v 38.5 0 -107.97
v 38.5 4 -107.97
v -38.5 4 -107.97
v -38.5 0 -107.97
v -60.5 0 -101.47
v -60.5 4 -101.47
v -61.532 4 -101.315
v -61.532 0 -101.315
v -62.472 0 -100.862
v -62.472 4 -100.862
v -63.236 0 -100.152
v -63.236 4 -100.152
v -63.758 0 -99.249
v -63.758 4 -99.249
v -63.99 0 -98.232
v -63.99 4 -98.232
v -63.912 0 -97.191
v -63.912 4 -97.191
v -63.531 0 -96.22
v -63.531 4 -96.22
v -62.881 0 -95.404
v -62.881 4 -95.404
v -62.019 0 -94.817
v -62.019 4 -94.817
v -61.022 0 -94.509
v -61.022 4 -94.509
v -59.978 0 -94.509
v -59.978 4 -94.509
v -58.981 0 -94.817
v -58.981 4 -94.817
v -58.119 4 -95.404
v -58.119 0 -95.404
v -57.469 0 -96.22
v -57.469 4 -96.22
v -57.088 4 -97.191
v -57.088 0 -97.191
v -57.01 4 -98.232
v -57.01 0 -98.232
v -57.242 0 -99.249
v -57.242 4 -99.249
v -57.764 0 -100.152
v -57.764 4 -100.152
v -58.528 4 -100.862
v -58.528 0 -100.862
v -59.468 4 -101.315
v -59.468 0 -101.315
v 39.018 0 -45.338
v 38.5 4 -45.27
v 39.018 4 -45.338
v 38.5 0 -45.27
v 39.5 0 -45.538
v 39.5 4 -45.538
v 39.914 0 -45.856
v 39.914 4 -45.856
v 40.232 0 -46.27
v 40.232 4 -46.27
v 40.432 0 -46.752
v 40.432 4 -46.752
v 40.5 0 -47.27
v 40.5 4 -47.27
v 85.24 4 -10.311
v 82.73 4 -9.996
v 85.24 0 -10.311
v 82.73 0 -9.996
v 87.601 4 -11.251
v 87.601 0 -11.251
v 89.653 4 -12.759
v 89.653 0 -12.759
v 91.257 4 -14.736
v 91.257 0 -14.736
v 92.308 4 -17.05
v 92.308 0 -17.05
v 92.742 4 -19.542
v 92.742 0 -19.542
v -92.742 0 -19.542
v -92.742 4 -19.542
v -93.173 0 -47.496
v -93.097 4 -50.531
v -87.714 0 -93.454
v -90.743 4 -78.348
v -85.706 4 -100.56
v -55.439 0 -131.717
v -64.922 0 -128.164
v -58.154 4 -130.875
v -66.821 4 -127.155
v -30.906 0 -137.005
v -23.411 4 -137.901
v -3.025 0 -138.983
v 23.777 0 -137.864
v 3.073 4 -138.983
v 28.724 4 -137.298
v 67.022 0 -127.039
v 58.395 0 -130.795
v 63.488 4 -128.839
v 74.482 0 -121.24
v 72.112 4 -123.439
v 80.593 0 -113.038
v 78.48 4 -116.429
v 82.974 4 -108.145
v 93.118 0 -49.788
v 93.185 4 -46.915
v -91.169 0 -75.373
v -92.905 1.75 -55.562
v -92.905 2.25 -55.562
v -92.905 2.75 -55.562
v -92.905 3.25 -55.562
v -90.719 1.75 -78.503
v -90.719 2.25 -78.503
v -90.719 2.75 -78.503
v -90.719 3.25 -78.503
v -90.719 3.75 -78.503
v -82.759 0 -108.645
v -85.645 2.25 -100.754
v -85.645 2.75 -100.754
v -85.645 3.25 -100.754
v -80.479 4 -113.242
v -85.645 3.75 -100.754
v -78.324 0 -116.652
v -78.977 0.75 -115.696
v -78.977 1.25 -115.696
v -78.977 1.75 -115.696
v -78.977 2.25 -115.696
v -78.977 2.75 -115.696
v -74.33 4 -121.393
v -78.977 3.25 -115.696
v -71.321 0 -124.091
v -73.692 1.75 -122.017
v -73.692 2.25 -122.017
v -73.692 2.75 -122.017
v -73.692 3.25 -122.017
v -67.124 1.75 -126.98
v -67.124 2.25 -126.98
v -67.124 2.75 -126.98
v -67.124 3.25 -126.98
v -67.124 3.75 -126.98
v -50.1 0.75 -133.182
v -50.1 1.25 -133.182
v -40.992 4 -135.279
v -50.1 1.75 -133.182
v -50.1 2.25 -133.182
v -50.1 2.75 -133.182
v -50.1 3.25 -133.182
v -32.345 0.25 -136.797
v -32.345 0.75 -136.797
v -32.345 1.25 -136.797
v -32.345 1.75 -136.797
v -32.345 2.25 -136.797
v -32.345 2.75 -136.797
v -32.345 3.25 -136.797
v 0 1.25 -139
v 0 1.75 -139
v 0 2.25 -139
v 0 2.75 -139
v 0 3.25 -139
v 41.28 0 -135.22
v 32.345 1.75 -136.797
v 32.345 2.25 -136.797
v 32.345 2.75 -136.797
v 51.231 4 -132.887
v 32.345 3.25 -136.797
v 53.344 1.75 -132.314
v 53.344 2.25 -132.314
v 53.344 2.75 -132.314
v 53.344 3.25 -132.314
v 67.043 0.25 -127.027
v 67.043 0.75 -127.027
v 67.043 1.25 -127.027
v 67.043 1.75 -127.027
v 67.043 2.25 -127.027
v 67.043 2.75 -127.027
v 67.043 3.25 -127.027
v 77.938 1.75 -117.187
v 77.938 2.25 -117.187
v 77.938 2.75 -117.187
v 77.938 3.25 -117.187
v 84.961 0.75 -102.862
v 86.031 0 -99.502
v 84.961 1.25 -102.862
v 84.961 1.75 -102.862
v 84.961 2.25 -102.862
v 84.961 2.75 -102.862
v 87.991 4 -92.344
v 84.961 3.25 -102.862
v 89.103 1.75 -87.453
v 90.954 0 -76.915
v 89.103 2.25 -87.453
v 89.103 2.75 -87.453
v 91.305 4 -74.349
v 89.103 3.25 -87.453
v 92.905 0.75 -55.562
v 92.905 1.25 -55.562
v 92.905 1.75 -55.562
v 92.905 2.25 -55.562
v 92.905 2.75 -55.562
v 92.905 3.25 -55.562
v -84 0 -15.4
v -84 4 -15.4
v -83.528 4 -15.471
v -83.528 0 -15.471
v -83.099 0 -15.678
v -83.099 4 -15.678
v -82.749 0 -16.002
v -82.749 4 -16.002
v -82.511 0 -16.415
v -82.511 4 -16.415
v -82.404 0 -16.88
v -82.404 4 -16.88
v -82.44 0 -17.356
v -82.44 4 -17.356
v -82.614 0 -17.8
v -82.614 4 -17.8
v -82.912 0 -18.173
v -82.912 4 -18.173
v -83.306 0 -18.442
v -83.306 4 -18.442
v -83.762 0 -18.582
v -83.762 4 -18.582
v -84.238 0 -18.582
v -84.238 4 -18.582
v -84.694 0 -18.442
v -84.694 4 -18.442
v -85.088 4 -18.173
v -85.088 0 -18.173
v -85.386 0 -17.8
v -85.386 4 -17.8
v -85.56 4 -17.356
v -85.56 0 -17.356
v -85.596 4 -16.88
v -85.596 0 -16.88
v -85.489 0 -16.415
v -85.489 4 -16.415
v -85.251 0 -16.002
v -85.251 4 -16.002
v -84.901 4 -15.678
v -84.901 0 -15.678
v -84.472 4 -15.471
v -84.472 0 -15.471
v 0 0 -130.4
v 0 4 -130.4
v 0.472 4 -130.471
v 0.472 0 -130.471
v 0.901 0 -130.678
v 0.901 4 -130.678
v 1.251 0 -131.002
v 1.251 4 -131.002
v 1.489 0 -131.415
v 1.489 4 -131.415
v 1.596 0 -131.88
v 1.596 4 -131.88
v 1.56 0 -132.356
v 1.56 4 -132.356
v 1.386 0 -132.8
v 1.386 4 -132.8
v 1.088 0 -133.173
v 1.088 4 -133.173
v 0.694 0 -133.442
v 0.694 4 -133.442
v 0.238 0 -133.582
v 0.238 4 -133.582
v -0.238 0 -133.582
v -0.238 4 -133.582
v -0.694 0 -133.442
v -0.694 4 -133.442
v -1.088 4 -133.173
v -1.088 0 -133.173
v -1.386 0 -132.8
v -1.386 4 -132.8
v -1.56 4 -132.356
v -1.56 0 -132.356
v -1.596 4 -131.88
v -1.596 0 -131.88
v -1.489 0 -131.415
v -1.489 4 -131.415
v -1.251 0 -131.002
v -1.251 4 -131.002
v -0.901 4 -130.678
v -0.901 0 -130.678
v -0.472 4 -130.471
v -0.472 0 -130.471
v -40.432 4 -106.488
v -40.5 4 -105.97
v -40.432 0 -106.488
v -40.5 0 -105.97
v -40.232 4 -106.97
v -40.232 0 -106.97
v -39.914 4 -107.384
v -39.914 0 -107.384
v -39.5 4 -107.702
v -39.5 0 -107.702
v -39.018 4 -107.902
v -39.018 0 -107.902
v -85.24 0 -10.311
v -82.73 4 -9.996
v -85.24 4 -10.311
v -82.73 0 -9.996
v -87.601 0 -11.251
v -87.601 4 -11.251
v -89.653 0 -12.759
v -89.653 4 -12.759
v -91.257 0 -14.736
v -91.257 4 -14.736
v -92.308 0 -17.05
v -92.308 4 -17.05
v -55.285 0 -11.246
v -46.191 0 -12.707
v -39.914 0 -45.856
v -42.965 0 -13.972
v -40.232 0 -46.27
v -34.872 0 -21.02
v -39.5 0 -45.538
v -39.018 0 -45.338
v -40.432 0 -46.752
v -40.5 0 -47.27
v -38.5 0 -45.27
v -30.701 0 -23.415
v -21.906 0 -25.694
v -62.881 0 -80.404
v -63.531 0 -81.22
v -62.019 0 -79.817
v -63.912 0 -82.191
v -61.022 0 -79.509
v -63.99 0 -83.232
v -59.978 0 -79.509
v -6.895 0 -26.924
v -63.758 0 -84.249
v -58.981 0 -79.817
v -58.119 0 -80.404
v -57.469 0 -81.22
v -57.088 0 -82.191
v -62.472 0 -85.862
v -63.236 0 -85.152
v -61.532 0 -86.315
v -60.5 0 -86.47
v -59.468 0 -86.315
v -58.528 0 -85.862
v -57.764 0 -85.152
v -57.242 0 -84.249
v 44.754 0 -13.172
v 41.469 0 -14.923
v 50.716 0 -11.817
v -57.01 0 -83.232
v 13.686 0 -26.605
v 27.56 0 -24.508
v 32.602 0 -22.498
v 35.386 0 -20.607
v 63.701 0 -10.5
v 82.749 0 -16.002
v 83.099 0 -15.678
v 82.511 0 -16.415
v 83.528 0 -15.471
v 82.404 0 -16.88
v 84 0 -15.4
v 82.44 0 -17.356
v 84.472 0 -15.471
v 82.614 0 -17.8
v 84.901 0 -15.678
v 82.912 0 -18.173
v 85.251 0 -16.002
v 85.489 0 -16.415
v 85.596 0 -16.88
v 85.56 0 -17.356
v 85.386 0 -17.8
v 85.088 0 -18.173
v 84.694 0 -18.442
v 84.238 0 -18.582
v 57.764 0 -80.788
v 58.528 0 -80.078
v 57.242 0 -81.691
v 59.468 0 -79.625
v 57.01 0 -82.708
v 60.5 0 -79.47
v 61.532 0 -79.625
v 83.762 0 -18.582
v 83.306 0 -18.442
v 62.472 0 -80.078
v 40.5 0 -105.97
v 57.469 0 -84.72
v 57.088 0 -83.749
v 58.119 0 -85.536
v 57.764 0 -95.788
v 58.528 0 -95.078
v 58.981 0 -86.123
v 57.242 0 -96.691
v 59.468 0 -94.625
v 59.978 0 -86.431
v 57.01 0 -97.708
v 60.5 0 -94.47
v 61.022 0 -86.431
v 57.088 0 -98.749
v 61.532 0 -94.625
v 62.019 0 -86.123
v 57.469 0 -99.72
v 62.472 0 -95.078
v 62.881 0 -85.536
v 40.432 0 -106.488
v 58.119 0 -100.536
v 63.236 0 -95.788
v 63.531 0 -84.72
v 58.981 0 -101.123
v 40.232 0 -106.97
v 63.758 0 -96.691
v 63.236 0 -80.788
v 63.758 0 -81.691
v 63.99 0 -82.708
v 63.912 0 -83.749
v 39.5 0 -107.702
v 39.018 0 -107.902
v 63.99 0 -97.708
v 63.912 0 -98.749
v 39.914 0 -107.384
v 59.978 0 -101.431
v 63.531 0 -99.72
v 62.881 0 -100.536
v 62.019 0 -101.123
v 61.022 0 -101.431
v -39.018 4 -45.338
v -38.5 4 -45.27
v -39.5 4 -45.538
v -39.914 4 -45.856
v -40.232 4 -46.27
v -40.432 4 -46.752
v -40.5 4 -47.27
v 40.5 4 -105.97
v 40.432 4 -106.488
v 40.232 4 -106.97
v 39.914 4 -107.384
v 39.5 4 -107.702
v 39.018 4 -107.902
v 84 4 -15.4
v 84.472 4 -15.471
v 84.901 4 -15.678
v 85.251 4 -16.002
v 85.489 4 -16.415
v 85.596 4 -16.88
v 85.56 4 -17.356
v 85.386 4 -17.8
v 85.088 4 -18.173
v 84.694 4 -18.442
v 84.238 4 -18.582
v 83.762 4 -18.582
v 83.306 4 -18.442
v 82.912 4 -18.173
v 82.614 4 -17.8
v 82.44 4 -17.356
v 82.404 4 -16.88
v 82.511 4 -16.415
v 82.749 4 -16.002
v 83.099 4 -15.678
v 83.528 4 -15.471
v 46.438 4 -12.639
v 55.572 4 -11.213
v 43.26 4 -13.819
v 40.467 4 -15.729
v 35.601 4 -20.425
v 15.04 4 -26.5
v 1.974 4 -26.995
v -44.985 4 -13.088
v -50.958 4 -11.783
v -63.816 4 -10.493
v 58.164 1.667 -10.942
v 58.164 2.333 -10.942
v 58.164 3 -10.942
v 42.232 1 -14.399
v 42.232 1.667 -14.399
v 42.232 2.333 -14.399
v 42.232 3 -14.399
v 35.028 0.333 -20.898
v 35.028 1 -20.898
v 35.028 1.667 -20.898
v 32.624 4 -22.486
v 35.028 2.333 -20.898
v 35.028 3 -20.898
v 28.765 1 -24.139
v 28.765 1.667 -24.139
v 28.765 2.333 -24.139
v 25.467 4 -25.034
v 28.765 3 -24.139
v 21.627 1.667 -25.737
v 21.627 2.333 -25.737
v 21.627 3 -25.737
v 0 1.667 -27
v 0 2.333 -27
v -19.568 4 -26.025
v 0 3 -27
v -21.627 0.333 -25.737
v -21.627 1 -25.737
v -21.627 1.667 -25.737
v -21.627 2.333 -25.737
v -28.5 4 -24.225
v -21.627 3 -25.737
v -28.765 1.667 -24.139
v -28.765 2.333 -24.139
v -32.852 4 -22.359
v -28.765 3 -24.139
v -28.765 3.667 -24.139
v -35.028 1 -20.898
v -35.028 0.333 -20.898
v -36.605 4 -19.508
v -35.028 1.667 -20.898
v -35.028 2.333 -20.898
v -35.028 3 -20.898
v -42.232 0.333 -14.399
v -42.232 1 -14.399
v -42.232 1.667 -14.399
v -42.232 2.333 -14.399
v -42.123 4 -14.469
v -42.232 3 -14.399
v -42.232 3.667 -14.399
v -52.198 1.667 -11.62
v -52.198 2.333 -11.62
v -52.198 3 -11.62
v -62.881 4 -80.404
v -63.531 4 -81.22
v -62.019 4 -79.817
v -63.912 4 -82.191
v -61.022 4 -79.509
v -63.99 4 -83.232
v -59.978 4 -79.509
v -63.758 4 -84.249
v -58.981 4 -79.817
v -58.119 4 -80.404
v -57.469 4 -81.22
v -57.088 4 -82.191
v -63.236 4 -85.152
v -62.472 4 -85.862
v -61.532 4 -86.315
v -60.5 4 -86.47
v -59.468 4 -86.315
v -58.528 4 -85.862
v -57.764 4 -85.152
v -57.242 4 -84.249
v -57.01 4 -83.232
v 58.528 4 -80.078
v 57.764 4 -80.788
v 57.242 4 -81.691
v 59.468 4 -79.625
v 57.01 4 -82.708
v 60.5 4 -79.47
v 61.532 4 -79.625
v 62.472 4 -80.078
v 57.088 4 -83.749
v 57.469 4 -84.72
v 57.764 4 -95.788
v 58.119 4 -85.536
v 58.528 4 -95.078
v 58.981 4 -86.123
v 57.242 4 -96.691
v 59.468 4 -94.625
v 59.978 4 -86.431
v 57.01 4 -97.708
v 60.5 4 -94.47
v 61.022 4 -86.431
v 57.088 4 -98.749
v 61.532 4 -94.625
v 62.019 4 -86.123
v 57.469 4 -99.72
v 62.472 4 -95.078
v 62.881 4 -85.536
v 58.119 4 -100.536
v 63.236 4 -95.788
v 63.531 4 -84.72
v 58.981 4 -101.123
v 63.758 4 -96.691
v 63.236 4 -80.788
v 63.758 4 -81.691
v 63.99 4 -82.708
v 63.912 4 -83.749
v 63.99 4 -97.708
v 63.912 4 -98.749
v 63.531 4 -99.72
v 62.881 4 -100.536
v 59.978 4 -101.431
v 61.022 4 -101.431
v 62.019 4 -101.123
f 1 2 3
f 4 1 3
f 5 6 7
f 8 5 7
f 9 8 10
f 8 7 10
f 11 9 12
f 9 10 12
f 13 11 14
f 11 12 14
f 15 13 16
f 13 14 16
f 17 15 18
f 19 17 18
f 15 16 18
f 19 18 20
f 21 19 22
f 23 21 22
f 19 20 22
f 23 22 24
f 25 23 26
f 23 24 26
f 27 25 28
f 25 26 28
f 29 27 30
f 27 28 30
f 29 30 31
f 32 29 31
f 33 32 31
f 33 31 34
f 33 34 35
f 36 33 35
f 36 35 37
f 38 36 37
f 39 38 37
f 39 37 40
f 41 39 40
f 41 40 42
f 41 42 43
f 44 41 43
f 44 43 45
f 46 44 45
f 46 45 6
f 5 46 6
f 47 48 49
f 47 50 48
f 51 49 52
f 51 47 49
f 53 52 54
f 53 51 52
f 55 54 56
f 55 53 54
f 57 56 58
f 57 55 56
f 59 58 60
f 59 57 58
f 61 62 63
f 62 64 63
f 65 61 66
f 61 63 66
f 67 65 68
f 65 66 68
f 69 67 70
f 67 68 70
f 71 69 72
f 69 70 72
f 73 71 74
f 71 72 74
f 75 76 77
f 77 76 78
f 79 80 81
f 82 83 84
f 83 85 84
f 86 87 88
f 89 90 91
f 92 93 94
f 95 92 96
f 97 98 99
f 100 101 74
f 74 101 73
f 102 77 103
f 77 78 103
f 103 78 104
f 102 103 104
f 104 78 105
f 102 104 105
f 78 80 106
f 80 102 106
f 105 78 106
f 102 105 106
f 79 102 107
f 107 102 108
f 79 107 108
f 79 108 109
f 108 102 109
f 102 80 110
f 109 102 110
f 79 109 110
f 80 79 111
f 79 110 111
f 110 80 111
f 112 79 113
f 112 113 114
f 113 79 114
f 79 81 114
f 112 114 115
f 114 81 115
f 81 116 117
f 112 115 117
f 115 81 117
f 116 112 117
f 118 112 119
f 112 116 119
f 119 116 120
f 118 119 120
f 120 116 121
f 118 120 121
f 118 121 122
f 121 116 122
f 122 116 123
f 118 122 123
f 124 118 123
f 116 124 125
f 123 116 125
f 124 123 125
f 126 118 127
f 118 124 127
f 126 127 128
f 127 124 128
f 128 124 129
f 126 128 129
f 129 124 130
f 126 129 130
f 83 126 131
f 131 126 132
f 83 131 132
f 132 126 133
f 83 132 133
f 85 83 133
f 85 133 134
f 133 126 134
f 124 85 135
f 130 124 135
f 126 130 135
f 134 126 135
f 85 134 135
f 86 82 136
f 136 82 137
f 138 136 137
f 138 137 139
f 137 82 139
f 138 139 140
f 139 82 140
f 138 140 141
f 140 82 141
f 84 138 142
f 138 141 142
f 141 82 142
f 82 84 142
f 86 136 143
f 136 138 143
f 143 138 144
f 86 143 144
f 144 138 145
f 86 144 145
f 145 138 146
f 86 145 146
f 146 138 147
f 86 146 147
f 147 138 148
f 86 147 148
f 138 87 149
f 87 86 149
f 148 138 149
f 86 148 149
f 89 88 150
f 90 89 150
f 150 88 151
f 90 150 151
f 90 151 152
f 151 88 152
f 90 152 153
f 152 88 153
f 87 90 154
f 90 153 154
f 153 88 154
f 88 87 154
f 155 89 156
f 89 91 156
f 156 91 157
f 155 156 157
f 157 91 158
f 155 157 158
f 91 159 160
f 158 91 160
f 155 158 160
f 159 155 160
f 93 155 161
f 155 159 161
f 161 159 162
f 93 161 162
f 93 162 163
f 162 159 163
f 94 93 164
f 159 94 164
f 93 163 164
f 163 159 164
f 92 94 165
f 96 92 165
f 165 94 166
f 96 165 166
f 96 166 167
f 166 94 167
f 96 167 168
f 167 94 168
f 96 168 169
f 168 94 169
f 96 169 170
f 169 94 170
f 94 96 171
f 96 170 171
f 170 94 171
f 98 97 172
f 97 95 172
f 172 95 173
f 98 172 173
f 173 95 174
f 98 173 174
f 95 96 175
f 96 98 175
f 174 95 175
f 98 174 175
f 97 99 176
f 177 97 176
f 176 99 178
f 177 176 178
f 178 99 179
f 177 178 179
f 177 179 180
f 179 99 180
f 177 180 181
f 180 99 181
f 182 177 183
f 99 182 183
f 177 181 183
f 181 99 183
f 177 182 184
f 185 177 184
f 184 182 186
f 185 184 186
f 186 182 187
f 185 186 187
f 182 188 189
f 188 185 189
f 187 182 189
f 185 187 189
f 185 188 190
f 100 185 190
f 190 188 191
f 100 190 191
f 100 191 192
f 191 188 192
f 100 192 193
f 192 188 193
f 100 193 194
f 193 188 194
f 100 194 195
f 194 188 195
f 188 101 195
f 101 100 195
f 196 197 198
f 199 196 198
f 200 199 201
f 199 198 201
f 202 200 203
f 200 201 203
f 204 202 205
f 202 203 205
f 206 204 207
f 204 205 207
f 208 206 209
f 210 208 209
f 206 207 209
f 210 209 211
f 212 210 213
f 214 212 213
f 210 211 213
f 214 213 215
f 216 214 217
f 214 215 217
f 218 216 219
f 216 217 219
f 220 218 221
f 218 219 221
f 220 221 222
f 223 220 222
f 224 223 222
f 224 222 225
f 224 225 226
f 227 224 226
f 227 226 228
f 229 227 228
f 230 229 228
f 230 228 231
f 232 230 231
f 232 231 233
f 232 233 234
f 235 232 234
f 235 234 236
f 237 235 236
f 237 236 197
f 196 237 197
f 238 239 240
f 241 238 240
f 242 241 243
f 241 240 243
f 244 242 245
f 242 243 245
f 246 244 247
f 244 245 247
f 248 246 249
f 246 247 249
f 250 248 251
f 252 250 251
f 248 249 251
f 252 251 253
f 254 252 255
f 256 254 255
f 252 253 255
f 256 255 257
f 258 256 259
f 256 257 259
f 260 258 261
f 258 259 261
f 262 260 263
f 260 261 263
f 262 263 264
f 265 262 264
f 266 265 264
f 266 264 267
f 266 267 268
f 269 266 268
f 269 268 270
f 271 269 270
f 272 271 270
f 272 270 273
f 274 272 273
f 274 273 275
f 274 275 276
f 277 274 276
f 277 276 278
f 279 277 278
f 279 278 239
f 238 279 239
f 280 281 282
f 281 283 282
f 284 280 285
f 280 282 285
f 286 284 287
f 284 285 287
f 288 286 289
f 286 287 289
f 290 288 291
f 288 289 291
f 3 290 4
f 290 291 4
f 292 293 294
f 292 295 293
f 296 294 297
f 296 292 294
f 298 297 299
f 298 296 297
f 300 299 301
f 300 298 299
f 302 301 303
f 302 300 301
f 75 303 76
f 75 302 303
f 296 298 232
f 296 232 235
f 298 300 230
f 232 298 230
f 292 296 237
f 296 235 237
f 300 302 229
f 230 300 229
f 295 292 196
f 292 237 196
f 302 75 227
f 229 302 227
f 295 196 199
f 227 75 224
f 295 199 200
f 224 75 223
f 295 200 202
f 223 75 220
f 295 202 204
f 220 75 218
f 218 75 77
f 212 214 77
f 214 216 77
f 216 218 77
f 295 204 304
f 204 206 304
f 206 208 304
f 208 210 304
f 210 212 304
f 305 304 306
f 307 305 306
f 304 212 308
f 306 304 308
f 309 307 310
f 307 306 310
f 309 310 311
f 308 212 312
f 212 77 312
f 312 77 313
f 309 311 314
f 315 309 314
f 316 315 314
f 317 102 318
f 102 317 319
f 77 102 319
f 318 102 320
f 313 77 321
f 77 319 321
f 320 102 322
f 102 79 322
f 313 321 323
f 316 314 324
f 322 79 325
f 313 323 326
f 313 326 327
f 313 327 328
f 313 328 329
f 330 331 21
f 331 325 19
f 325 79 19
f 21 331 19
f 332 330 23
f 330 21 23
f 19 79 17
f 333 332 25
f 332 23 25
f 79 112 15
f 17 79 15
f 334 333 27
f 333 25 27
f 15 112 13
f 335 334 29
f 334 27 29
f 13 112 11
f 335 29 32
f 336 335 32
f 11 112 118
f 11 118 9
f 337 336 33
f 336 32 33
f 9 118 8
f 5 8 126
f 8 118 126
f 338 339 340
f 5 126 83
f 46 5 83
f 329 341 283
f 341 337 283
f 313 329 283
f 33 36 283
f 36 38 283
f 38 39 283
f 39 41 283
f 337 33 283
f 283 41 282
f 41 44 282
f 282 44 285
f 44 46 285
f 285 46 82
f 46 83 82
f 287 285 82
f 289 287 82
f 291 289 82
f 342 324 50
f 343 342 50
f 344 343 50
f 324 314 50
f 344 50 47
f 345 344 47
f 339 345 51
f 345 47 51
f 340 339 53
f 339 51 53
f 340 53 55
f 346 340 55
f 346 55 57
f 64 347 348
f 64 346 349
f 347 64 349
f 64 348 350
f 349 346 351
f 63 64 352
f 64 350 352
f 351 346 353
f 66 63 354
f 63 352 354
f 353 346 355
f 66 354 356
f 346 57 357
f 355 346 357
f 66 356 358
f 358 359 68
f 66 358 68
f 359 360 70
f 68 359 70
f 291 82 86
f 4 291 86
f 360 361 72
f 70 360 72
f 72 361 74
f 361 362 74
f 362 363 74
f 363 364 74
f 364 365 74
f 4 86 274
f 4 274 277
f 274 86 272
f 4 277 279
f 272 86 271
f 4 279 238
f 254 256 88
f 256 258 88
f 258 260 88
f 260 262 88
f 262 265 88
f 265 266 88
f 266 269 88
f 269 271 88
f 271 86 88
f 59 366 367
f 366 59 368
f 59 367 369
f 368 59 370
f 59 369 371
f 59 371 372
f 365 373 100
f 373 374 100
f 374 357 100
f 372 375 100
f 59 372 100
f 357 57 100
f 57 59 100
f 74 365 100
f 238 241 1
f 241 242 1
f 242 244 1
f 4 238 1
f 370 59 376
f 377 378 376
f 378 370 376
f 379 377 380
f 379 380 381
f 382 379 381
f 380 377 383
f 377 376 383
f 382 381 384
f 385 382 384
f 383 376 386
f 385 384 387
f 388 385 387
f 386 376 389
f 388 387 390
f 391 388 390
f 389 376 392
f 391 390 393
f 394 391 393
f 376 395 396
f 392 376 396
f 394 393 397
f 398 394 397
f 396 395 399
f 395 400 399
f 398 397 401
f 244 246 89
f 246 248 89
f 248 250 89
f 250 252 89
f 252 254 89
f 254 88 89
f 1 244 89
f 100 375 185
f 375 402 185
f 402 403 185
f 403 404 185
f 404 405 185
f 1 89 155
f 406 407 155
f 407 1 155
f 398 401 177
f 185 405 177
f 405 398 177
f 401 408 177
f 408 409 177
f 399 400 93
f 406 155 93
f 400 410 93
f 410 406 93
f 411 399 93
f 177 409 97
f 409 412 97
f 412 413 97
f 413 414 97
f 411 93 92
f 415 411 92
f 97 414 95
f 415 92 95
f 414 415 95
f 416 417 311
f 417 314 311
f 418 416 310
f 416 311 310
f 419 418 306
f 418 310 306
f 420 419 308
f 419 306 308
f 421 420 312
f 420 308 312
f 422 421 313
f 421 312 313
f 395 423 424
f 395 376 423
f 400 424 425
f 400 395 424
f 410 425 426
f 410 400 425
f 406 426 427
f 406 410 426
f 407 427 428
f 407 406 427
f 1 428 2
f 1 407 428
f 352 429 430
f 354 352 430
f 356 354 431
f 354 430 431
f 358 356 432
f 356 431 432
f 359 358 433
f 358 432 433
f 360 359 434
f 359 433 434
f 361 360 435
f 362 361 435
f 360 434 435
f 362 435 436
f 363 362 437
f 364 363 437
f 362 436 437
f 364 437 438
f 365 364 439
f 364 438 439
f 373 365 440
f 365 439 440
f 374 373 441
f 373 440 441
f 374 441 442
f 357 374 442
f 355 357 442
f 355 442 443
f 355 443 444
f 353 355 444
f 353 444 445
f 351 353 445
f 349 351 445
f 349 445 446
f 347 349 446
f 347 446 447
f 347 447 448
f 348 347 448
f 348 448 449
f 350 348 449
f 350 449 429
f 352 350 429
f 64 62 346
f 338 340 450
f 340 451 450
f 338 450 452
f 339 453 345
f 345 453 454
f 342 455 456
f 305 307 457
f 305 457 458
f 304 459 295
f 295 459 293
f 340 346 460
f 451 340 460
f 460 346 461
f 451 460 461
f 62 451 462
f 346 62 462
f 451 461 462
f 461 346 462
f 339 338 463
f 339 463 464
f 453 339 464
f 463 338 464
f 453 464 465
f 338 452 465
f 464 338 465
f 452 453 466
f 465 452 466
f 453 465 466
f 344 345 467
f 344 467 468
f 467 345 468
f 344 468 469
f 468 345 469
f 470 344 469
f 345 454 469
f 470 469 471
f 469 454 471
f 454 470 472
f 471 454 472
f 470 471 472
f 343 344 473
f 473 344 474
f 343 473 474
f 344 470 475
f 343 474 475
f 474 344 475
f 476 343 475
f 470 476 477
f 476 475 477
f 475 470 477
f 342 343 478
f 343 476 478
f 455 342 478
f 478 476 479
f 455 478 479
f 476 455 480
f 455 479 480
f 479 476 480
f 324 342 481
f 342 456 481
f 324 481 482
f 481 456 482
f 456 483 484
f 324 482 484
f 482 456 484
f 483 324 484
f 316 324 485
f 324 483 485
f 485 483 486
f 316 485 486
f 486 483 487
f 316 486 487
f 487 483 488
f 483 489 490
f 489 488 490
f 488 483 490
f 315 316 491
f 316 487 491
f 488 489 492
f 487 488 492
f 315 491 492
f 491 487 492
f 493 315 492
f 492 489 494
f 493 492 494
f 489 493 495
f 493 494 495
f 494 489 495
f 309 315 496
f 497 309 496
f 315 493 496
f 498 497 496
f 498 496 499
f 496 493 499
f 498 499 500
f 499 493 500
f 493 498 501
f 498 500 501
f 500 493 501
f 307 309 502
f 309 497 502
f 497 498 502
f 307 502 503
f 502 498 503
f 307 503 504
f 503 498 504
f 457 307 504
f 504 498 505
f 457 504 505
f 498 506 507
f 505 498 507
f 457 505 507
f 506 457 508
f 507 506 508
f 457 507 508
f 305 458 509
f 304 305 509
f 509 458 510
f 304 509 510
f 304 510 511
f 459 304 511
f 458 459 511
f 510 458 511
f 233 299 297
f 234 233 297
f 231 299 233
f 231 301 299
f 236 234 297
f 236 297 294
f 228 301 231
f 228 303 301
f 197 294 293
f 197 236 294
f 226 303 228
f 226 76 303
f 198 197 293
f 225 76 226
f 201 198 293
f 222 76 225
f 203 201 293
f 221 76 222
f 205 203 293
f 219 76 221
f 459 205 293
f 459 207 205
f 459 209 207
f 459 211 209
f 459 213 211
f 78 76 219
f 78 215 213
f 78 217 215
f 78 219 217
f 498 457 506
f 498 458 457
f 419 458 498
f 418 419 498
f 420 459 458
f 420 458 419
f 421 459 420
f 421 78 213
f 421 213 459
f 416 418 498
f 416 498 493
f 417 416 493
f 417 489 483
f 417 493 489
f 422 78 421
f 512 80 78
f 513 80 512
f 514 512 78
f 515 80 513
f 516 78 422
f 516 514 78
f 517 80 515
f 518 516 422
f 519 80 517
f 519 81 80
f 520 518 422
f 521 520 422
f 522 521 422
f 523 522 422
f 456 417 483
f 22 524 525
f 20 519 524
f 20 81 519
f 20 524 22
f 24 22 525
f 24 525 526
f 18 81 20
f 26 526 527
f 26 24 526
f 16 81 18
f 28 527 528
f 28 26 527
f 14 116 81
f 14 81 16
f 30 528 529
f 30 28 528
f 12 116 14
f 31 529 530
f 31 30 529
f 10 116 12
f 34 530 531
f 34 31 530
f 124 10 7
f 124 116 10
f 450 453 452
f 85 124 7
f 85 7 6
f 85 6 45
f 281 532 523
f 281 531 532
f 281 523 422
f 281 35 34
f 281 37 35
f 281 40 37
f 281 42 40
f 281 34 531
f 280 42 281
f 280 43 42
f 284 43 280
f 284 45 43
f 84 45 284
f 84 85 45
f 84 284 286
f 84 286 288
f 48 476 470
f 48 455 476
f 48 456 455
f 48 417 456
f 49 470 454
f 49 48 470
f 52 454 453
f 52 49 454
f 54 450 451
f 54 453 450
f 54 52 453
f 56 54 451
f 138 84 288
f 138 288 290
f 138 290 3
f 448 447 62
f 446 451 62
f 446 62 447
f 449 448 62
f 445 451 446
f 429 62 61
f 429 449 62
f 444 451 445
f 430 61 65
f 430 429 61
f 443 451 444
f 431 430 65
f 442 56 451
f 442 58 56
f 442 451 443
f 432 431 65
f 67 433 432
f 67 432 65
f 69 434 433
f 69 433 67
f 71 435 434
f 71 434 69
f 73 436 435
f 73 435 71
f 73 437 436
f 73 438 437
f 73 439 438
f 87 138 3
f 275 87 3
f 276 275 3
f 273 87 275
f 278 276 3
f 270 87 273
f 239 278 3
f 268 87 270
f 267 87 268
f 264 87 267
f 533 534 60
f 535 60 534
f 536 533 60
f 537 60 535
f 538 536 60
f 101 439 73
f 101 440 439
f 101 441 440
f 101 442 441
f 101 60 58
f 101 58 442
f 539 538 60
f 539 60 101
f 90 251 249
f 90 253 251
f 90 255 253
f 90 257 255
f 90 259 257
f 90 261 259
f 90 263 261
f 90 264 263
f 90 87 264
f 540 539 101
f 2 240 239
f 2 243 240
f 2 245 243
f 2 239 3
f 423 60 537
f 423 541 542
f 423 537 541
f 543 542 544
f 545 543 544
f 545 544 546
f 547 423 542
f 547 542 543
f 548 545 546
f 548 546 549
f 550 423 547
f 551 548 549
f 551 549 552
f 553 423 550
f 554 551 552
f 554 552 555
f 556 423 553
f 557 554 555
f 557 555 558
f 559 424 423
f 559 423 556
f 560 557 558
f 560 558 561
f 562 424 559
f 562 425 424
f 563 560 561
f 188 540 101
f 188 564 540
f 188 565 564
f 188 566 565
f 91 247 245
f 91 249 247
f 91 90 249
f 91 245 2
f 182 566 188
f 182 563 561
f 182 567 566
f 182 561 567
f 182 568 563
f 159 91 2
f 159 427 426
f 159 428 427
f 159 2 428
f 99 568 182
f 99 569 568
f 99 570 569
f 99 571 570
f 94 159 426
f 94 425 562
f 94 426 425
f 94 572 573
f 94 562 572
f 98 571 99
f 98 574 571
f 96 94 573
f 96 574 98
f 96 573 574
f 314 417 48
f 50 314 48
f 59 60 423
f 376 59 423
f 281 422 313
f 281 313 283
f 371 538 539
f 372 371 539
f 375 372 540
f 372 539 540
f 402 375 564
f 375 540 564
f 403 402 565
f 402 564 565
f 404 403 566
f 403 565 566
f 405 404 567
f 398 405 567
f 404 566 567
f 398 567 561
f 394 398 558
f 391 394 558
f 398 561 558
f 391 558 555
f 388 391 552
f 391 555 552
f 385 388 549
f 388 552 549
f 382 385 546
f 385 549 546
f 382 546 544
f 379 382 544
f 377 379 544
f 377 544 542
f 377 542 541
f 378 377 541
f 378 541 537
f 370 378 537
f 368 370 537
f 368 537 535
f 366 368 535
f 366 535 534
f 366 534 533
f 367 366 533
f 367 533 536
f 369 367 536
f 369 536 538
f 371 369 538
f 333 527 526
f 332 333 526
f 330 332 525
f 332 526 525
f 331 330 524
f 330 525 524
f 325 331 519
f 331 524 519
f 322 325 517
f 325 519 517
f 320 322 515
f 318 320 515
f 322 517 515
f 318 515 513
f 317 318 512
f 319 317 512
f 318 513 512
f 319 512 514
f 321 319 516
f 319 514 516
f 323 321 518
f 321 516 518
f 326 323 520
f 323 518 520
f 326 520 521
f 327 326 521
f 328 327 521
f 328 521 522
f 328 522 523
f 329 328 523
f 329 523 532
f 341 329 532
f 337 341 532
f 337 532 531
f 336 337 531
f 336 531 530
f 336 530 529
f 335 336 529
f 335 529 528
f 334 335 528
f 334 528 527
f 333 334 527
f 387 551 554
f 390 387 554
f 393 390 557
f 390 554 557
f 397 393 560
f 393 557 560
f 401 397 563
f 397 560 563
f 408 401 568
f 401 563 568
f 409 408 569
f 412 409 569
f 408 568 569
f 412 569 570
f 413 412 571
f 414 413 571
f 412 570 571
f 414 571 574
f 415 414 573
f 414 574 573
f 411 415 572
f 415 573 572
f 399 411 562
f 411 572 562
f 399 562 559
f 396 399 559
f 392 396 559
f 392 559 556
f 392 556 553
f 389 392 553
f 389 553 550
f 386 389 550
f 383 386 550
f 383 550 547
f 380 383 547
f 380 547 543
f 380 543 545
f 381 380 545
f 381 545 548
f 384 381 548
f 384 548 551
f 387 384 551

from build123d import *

# Parameters (mm, degrees)
SKETCH1_W           = 240
SKETCH1_H           = 310
BOSS_EXTRUDE1_DEPTH = 4
CUT_EXTRUDE1_REACH  = 198.064
SKETCH2_R           = 1.75
CUT_EXTRUDE2_REACH  = 198.064
SKETCH3_R           = 1.75
FILLET3_R           = 3
SKETCH4_R           = 1.6
CUT_EXTRUDE3_DEPTH  = 5
FILLET4_R           = 10
SKETCH5_R           = 1.6
CUT_EXTRUDE4_DEPTH  = 168.426582877
SKETCH6_W           = 37.6
SKETCH6_H           = 62.7
SKETCH6_W_2         = 5.8
CUT_EXTRUDE5_DEPTH  = 168.426582877
SKETCH7_R           = 3.5
CUT_EXTRUDE6_DEPTH  = 168.426582877
FILLET5_R           = 2


with BuildPart() as part:
    # Sketch1 → Boss-Extrude1 (new body)
    with BuildSketch(Plane(origin=(0, 0, 0), x_dir=(1, 0, 0), z_dir=(0, 1, 0))):
        Rectangle(SKETCH1_W, SKETCH1_H)
    extrude(amount=BOSS_EXTRUDE1_DEPTH)

    # Sketch2 → Cut-Extrude1 (cut, up to next)
    with BuildSketch(Plane(origin=(0, 4, 0), x_dir=(1, 0, 0), z_dir=(0, 1, 0)), mode=Mode.PRIVATE) as cut_extrude1_sk1:
        with BuildLine():
            Line((-120, 155), (-120, 0))
            add(Edge.make_bspline(
                [(0, 155), (-30.572222193, 155), (-80.343316982, 153.733320995), (-119.221157946, 117.654395612), (-120, 45.41001223), (-120, 0)],
                knots=[0, 0, 0, 0, 0.458017491, 0.558017491, 1, 1, 1, 1], degree=3))
            Line((0, 155), (-120, 155))
        make_face()
    cut_extrude1_tool1 = extrude(cut_extrude1_sk1.sketch, amount=-CUT_EXTRUDE1_REACH, mode=Mode.PRIVATE) & part.part
    # Sketch2 → Cut-Extrude1 (cut, up to next)
    with BuildSketch(Plane(origin=(0, 4, 0), x_dir=(1, 0, 0), z_dir=(0, 1, 0)), mode=Mode.PRIVATE) as cut_extrude1_sk2:
        with BuildLine():
            add(Edge.make_bspline(
                [(0, 155), (30.572222193, 155), (80.343316982, 153.733320995), (119.221157946, 117.654395612), (120, 45.41001223), (120, 0)],
                knots=[0, 0, 0, 0, 0.458017491, 0.558017491, 1, 1, 1, 1], degree=3))
            Line((120, 0), (120, 155))
            Line((120, 155), (0, 155))
        make_face()
    cut_extrude1_tool2 = extrude(cut_extrude1_sk2.sketch, amount=-CUT_EXTRUDE1_REACH, mode=Mode.PRIVATE) & part.part
    # Sketch2 → Cut-Extrude1 (cut, up to next)
    with BuildSketch(Plane(origin=(0, 4, 0), x_dir=(1, 0, 0), z_dir=(0, 1, 0)), mode=Mode.PRIVATE) as cut_extrude1_sk3:
        with BuildLine():
            Line((120, -155), (120, 0))
            add(Edge.make_bspline(
                [(0, -155), (30.572222193, -155), (80.343316982, -153.733320995), (119.221157946, -117.654395612), (120, -45.41001223), (120, 0)],
                knots=[0, 0, 0, 0, 0.458017491, 0.558017491, 1, 1, 1, 1], degree=3))
            Line((0, -155), (120, -155))
        make_face()
    cut_extrude1_tool3 = extrude(cut_extrude1_sk3.sketch, amount=-CUT_EXTRUDE1_REACH, mode=Mode.PRIVATE) & part.part
    # Sketch2 → Cut-Extrude1 (cut, up to next)
    with BuildSketch(Plane(origin=(0, 4, 0), x_dir=(1, 0, 0), z_dir=(0, 1, 0)), mode=Mode.PRIVATE) as cut_extrude1_sk4:
        with BuildLine():
            add(Edge.make_bspline(
                [(0, -155), (-30.572222193, -155), (-80.343316982, -153.733320995), (-119.221157946, -117.654395612), (-120, -45.41001223), (-120, 0)],
                knots=[0, 0, 0, 0, 0.458017491, 0.558017491, 1, 1, 1, 1], degree=3))
            Line((-120, 0), (-120, -155))
            Line((-120, -155), (0, -155))
        make_face()
    cut_extrude1_tool4 = extrude(cut_extrude1_sk4.sketch, amount=-CUT_EXTRUDE1_REACH, mode=Mode.PRIVATE) & part.part
    # Sketch2 → Cut-Extrude1 (cut, up to next)
    with BuildSketch(Plane(origin=(0, 4, 0), x_dir=(1, 0, 0), z_dir=(0, 1, 0)), mode=Mode.PRIVATE) as cut_extrude1_sk5:
        with Locations(Location((-88.957037006, 132.338171163, 0), (0, 0, 270))):
            Circle(SKETCH2_R)
    cut_extrude1_tool5 = extrude(cut_extrude1_sk5.sketch, amount=-CUT_EXTRUDE1_REACH, mode=Mode.PRIVATE) & part.part
    # Sketch2 → Cut-Extrude1 (cut, up to next)
    with BuildSketch(Plane(origin=(0, 4, 0), x_dir=(1, 0, 0), z_dir=(0, 1, 0)), mode=Mode.PRIVATE) as cut_extrude1_sk6:
        with Locations(Location((0, 146, 0), (0, 0, 270))):
            Circle(SKETCH2_R)
    cut_extrude1_tool6 = extrude(cut_extrude1_sk6.sketch, amount=-CUT_EXTRUDE1_REACH, mode=Mode.PRIVATE) & part.part
    # Sketch2 → Cut-Extrude1 (cut, up to next)
    with BuildSketch(Plane(origin=(0, 4, 0), x_dir=(1, 0, 0), z_dir=(0, 1, 0)), mode=Mode.PRIVATE) as cut_extrude1_sk7:
        with Locations(Location((88.957037006, 132.338171163, 0), (0, 0, 270))):
            Circle(SKETCH2_R)
    cut_extrude1_tool7 = extrude(cut_extrude1_sk7.sketch, amount=-CUT_EXTRUDE1_REACH, mode=Mode.PRIVATE) & part.part
    # Sketch2 → Cut-Extrude1 (cut, up to next)
    with BuildSketch(Plane(origin=(0, 4, 0), x_dir=(1, 0, 0), z_dir=(0, 1, 0)), mode=Mode.PRIVATE) as cut_extrude1_sk8:
        with Locations(Location((-110.418476952, 44.934472183, 0), (0, 0, 270))):
            Circle(SKETCH2_R)
    cut_extrude1_tool8 = extrude(cut_extrude1_sk8.sketch, amount=-CUT_EXTRUDE1_REACH, mode=Mode.PRIVATE) & part.part
    # Sketch2 → Cut-Extrude1 (cut, up to next)
    with BuildSketch(Plane(origin=(0, 4, 0), x_dir=(1, 0, 0), z_dir=(0, 1, 0)), mode=Mode.PRIVATE) as cut_extrude1_sk9:
        with Locations(Location((-49, -30, 0), (0, 0, 270))):
            Circle(SKETCH2_R)
    cut_extrude1_tool9 = extrude(cut_extrude1_sk9.sketch, amount=-CUT_EXTRUDE1_REACH, mode=Mode.PRIVATE) & part.part
    # Sketch2 → Cut-Extrude1 (cut, up to next)
    with BuildSketch(Plane(origin=(0, 4, 0), x_dir=(1, 0, 0), z_dir=(0, 1, 0)), mode=Mode.PRIVATE) as cut_extrude1_sk10:
        with Locations(Location((49, -30, 0), (0, 0, 270))):
            Circle(SKETCH2_R)
    cut_extrude1_tool10 = extrude(cut_extrude1_sk10.sketch, amount=-CUT_EXTRUDE1_REACH, mode=Mode.PRIVATE) & part.part
    # Sketch2 → Cut-Extrude1 (cut, up to next)
    with BuildSketch(Plane(origin=(0, 4, 0), x_dir=(1, 0, 0), z_dir=(0, 1, 0)), mode=Mode.PRIVATE) as cut_extrude1_sk11:
        with Locations(Location((-88.957037006, -132.338171163, 0), (0, 0, 270))):
            Circle(SKETCH2_R)
    cut_extrude1_tool11 = extrude(cut_extrude1_sk11.sketch, amount=-CUT_EXTRUDE1_REACH, mode=Mode.PRIVATE) & part.part
    # Sketch2 → Cut-Extrude1 (cut, up to next)
    with BuildSketch(Plane(origin=(0, 4, 0), x_dir=(1, 0, 0), z_dir=(0, 1, 0)), mode=Mode.PRIVATE) as cut_extrude1_sk12:
        with Locations(Location((0, -146, 0), (0, 0, 270))):
            Circle(SKETCH2_R)
    cut_extrude1_tool12 = extrude(cut_extrude1_sk12.sketch, amount=-CUT_EXTRUDE1_REACH, mode=Mode.PRIVATE) & part.part
    # Sketch2 → Cut-Extrude1 (cut, up to next)
    with BuildSketch(Plane(origin=(0, 4, 0), x_dir=(1, 0, 0), z_dir=(0, 1, 0)), mode=Mode.PRIVATE) as cut_extrude1_sk13:
        with Locations(Location((88.957037006, -132.338171163, 0), (0, 0, 270))):
            Circle(SKETCH2_R)
    cut_extrude1_tool13 = extrude(cut_extrude1_sk13.sketch, amount=-CUT_EXTRUDE1_REACH, mode=Mode.PRIVATE) & part.part
    # Sketch2 → Cut-Extrude1 (cut, up to next)
    with BuildSketch(Plane(origin=(0, 4, 0), x_dir=(1, 0, 0), z_dir=(0, 1, 0)), mode=Mode.PRIVATE) as cut_extrude1_sk14:
        with Locations(Location((110.418476952, 44.934472183, 0), (0, 0, 270))):
            Circle(SKETCH2_R)
    cut_extrude1_tool14 = extrude(cut_extrude1_sk14.sketch, amount=-CUT_EXTRUDE1_REACH, mode=Mode.PRIVATE) & part.part
    add(cut_extrude1_tool1.solids().sort_by_distance((-102.173006, 4, -133.115769))[0], mode=Mode.SUBTRACT)
    add(cut_extrude1_tool2.solids().sort_by_distance((102.087926, 4, -133.133004))[0], mode=Mode.SUBTRACT)
    add(cut_extrude1_tool3.solids().sort_by_distance((102.087926, 4, 133.133004))[0], mode=Mode.SUBTRACT)
    add(cut_extrude1_tool4.solids().sort_by_distance((-102.173006, 4, 133.115769))[0], mode=Mode.SUBTRACT)
    add(cut_extrude1_tool5.solids().sort_by_distance((-88.957037, 4, -132.338171))[0], mode=Mode.SUBTRACT)
    add(cut_extrude1_tool6.solids().sort_by_distance((0, 4, -146))[0], mode=Mode.SUBTRACT)
    add(cut_extrude1_tool7.solids().sort_by_distance((88.957037, 4, -132.338171))[0], mode=Mode.SUBTRACT)
    add(cut_extrude1_tool8.solids().sort_by_distance((-110.418477, 4, -44.934472))[0], mode=Mode.SUBTRACT)
    add(cut_extrude1_tool9.solids().sort_by_distance((-49, 4, 30))[0], mode=Mode.SUBTRACT)
    add(cut_extrude1_tool10.solids().sort_by_distance((49, 4, 30))[0], mode=Mode.SUBTRACT)
    add(cut_extrude1_tool11.solids().sort_by_distance((-88.957037, 4, 132.338171))[0], mode=Mode.SUBTRACT)
    add(cut_extrude1_tool12.solids().sort_by_distance((0, 4, 146))[0], mode=Mode.SUBTRACT)
    add(cut_extrude1_tool13.solids().sort_by_distance((88.957037, 4, 132.338171))[0], mode=Mode.SUBTRACT)
    add(cut_extrude1_tool14.solids().sort_by_distance((110.418477, 4, -44.934472))[0], mode=Mode.SUBTRACT)

    # Sketch3 → Cut-Extrude2 (cut, up to next)
    with BuildSketch(Plane(origin=(0, 4, 0), x_dir=(1, 0, 0), z_dir=(0, 1, 0)), mode=Mode.PRIVATE) as cut_extrude2_sk1:
        with BuildLine():
            Line((-120, 0), (120, 0))
            add(Edge.make_bspline(
                [(0, -155), (30.572222193, -155), (80.343316982, -153.733320995), (119.221157946, -117.654395612), (120, -45.41001223), (120, 0)],
                knots=[0, 0, 0, 0, 0.458017491, 0.558017491, 1, 1, 1, 1], degree=3))
            add(Edge.make_bspline(
                [(-120, 0), (-120, -45.41001223), (-119.221157946, -117.654395612), (-80.343316982, -153.733320995), (-30.572222193, -155), (0, -155)],
                knots=[0, 0, 0, 0, 0.441982509, 0.541982509, 1, 1, 1, 1], degree=3))
        make_face()
        with Locations((88.957037006, -132.338171163)):
            Circle(SKETCH3_R, mode=Mode.SUBTRACT)
        with Locations((49, -30)):
            Circle(SKETCH3_R, mode=Mode.SUBTRACT)
        with Locations((-88.957037006, -132.338171163)):
            Circle(SKETCH3_R, mode=Mode.SUBTRACT)
        with Locations((-49, -30)):
            Circle(SKETCH3_R, mode=Mode.SUBTRACT)
        with Locations((0, -146)):
            Circle(SKETCH3_R, mode=Mode.SUBTRACT)
    cut_extrude2_tool1 = extrude(cut_extrude2_sk1.sketch, amount=-CUT_EXTRUDE2_REACH, mode=Mode.PRIVATE) & part.part
    # Sketch3 → Cut-Extrude2 (cut, up to next)
    with BuildSketch(Plane(origin=(0, 4, 0), x_dir=(1, 0, 0), z_dir=(0, 1, 0)), mode=Mode.PRIVATE) as cut_extrude2_sk2:
        with BuildLine():
            add(Edge.make_bspline(
                [(-119.996868981, 5), (-119.999161826, 3.317063079), (-120, 1.649620662), (-120, 0)],
                knots=[0.983943993, 0.983943993, 0.983943993, 0.983943993, 1, 1, 1, 1], degree=3))
            Line((-120, 0), (120, 0))
            add(Edge.make_bspline(
                [(120, 0), (120, 1.649620662), (119.999161826, 3.317063079), (119.996868981, 5)],
                knots=[0, 0, 0, 0, 0.016056007, 0.016056007, 0.016056007, 0.016056007], degree=3))
            Line((119.996868981, 5), (-119.996868981, 5))
        make_face()
    cut_extrude2_tool2 = extrude(cut_extrude2_sk2.sketch, amount=-CUT_EXTRUDE2_REACH, mode=Mode.PRIVATE) & part.part
    add(cut_extrude2_tool1.solids().sort_by_distance((0, 4, 73.058016))[0], mode=Mode.SUBTRACT)
    add(cut_extrude2_tool2.solids().sort_by_distance((0, 4, -2.499989))[0], mode=Mode.SUBTRACT)

    # Fillet3
    fillet3_edges = [part.edges().sort_by_distance(p)[0] for p in [
        (119.996868981, 2, -5),
        (-119.996868981, 2, -5),
    ]]
    fillet(fillet3_edges, radius=FILLET3_R)

    # Sketch4 → Cut-Extrude3 (cut)
    # profile 1 of 2: a face of its own
    with BuildSketch(Plane(origin=(0, 4, 0), x_dir=(1, 0, 0), z_dir=(0, 1, 0))):
        with BuildLine():
            ThreePointArc((-119.991132673, 8.007468224), (-119.115101087, 5.881321718), (-116.991141968, 5))
            Line((-116.991141968, 5), (116.991141968, 5))
            ThreePointArc((116.991141968, 5), (119.115101087, 5.881321718), (119.991132673, 8.007468224))
            add(Edge.make_bspline(
                [(0, 155), (30.572222193, 155), (80.343316982, 153.733320995), (118.227056859, 118.576928811), (119.881344424, 52.109482017), (119.991132673, 8.007468224)],
                knots=[0, 0, 0, 0, 0.458017491, 0.558017491, 0.974430136, 0.974430136, 0.974430136, 0.974430136], degree=3))
            add(Edge.make_bspline(
                [(0, 155), (-30.572222193, 155), (-80.343316982, 153.733320995), (-118.227056859, 118.576928811), (-119.881344424, 52.109482017), (-119.991132673, 8.007468224)],
                knots=[0, 0, 0, 0, 0.458017491, 0.558017491, 0.974430136, 0.974430136, 0.974430136, 0.974430136], degree=3))
        make_face()
        with BuildLine():
            add(Edge.make_bspline(
                [(-92.233514507, 10), (-80.664301387, 10), (-67.379754657, 9.832976348), (-50.821281342, 11.756445914), (-41.687640008, 13.092793482), (-34.61054209, 23.0328201), (-19.157922754, 26.773253881), (-6.717349602, 27), (0, 27)],
                knots=[0, 0, 0, 0, 0.354854857, 0.417368962, 0.525089505, 0.626100692, 0.774450144, 1, 1, 1, 1], degree=3))
            add(Edge.make_bspline(
                [(-92.233514507, 10), (-93.109031306, 24.461653993), (-94.141297679, 55.929427893), (-89.848799736, 89.042535108), (-82.77661836, 109.219212766), (-77.505758875, 118.879248593), (-67.56067431, 127.964233668), (-51.20251433, 133.204450958), (-28.956327731, 138.000468293), (-10.500871466, 139), (0, 139)],
                knots=[0.048683265, 0.048683265, 0.048683265, 0.048683265, 0.273512027, 0.499348708, 0.541604418, 0.589205488, 0.661188988, 0.734095029, 0.840040992, 1, 1, 1, 1], degree=3))
            add(Edge.make_bspline(
                [(92.233514507, 10), (93.109031306, 24.461653993), (94.141297679, 55.929427893), (89.848799736, 89.042535108), (82.77661836, 109.219212766), (77.505758875, 118.879248593), (67.56067431, 127.964233668), (51.20251433, 133.204450958), (28.956327731, 138.000468293), (10.500871466, 139), (0, 139)],
                knots=[0.048683265, 0.048683265, 0.048683265, 0.048683265, 0.273512027, 0.499348708, 0.541604418, 0.589205488, 0.661188988, 0.734095029, 0.840040992, 1, 1, 1, 1], degree=3))
            add(Edge.make_bspline(
                [(92.233514507, 10), (80.664301387, 10), (67.379754657, 9.832976348), (50.821281342, 11.756445914), (41.687640008, 13.092793482), (34.61054209, 23.0328201), (19.157922754, 26.773253881), (6.717349602, 27), (0, 27)],
                knots=[0, 0, 0, 0, 0.354854857, 0.417368962, 0.525089505, 0.626100692, 0.774450144, 1, 1, 1, 1], degree=3))
        make_face(mode=Mode.SUBTRACT)
    # profile 2 of 2: a face of its own
    with BuildSketch(Plane(origin=(0, 4, 0), x_dir=(1, 0, 0), z_dir=(0, 1, 0))):
        with Locations(Location((0, 132, 0), (0, 0, 270))):
            Circle(SKETCH4_R)
    extrude(amount=-CUT_EXTRUDE3_DEPTH, mode=Mode.SUBTRACT)

    # Fillet4
    fillet4_edges = [part.edges().sort_by_distance(p)[0] for p in [
        (92.233514507, 2, -10),
        (-92.233514507, 2, -10),
    ]]
    fillet(fillet4_edges, radius=FILLET4_R)

    # Sketch5 → Cut-Extrude4 (cut, through all)
    with BuildSketch(Plane(origin=(0, 4, 0), x_dir=(1, 0, 0), z_dir=(0, 1, 0))):
        with Locations(Location((-84, 17, 0), (0, 0, 270))):
            Circle(SKETCH5_R)
        with Locations(Location((84, 17, 0), (0, 0, 270))):
            Circle(SKETCH5_R)
    extrude(amount=-CUT_EXTRUDE4_DEPTH, mode=Mode.SUBTRACT)

    # Sketch6 → Cut-Extrude5 (cut, through all)
    with BuildSketch(Plane(origin=(0, 4, 0), x_dir=(1, 0, 0), z_dir=(0, 1, 0))):
        with Locations((-21.7, 76.62)):
            Rectangle(SKETCH6_W, SKETCH6_H)
        with Locations((0, 76.62)):
            Rectangle(SKETCH6_W_2, SKETCH6_H)
        with Locations((21.7, 76.62)):
            Rectangle(SKETCH6_W, SKETCH6_H)
    extrude(amount=-CUT_EXTRUDE5_DEPTH, mode=Mode.SUBTRACT)

    # Sketch7 → Cut-Extrude6 (cut, through all)
    with BuildSketch(Plane(origin=(0, 4, 0), x_dir=(1, 0, 0), z_dir=(0, 1, 0))):
        with Locations(Location((60.5, 97.97, 0), (0, 0, 270))):
            Circle(SKETCH7_R)
        with Locations(Location((-60.5, 97.97, 0), (0, 0, 90))):
            Circle(SKETCH7_R)
        with Locations(Location((60.5, 82.97, 0), (0, 0, 270))):
            Circle(SKETCH7_R)
        with Locations(Location((-60.5, 82.97, 0), (0, 0, 90))):
            Circle(SKETCH7_R)
    extrude(amount=-CUT_EXTRUDE6_DEPTH, mode=Mode.SUBTRACT)

    # Fillet5
    fillet5_edges = [part.edges().sort_by_distance(p)[0] for p in [
        (40.5, 2, -45.27),
        (-40.5, 2, -45.27),
        (-40.5, 2, -107.97),
        (40.5, 2, -107.97),
    ]]
    fillet(fillet5_edges, radius=FILLET5_R)


solid = part.part
